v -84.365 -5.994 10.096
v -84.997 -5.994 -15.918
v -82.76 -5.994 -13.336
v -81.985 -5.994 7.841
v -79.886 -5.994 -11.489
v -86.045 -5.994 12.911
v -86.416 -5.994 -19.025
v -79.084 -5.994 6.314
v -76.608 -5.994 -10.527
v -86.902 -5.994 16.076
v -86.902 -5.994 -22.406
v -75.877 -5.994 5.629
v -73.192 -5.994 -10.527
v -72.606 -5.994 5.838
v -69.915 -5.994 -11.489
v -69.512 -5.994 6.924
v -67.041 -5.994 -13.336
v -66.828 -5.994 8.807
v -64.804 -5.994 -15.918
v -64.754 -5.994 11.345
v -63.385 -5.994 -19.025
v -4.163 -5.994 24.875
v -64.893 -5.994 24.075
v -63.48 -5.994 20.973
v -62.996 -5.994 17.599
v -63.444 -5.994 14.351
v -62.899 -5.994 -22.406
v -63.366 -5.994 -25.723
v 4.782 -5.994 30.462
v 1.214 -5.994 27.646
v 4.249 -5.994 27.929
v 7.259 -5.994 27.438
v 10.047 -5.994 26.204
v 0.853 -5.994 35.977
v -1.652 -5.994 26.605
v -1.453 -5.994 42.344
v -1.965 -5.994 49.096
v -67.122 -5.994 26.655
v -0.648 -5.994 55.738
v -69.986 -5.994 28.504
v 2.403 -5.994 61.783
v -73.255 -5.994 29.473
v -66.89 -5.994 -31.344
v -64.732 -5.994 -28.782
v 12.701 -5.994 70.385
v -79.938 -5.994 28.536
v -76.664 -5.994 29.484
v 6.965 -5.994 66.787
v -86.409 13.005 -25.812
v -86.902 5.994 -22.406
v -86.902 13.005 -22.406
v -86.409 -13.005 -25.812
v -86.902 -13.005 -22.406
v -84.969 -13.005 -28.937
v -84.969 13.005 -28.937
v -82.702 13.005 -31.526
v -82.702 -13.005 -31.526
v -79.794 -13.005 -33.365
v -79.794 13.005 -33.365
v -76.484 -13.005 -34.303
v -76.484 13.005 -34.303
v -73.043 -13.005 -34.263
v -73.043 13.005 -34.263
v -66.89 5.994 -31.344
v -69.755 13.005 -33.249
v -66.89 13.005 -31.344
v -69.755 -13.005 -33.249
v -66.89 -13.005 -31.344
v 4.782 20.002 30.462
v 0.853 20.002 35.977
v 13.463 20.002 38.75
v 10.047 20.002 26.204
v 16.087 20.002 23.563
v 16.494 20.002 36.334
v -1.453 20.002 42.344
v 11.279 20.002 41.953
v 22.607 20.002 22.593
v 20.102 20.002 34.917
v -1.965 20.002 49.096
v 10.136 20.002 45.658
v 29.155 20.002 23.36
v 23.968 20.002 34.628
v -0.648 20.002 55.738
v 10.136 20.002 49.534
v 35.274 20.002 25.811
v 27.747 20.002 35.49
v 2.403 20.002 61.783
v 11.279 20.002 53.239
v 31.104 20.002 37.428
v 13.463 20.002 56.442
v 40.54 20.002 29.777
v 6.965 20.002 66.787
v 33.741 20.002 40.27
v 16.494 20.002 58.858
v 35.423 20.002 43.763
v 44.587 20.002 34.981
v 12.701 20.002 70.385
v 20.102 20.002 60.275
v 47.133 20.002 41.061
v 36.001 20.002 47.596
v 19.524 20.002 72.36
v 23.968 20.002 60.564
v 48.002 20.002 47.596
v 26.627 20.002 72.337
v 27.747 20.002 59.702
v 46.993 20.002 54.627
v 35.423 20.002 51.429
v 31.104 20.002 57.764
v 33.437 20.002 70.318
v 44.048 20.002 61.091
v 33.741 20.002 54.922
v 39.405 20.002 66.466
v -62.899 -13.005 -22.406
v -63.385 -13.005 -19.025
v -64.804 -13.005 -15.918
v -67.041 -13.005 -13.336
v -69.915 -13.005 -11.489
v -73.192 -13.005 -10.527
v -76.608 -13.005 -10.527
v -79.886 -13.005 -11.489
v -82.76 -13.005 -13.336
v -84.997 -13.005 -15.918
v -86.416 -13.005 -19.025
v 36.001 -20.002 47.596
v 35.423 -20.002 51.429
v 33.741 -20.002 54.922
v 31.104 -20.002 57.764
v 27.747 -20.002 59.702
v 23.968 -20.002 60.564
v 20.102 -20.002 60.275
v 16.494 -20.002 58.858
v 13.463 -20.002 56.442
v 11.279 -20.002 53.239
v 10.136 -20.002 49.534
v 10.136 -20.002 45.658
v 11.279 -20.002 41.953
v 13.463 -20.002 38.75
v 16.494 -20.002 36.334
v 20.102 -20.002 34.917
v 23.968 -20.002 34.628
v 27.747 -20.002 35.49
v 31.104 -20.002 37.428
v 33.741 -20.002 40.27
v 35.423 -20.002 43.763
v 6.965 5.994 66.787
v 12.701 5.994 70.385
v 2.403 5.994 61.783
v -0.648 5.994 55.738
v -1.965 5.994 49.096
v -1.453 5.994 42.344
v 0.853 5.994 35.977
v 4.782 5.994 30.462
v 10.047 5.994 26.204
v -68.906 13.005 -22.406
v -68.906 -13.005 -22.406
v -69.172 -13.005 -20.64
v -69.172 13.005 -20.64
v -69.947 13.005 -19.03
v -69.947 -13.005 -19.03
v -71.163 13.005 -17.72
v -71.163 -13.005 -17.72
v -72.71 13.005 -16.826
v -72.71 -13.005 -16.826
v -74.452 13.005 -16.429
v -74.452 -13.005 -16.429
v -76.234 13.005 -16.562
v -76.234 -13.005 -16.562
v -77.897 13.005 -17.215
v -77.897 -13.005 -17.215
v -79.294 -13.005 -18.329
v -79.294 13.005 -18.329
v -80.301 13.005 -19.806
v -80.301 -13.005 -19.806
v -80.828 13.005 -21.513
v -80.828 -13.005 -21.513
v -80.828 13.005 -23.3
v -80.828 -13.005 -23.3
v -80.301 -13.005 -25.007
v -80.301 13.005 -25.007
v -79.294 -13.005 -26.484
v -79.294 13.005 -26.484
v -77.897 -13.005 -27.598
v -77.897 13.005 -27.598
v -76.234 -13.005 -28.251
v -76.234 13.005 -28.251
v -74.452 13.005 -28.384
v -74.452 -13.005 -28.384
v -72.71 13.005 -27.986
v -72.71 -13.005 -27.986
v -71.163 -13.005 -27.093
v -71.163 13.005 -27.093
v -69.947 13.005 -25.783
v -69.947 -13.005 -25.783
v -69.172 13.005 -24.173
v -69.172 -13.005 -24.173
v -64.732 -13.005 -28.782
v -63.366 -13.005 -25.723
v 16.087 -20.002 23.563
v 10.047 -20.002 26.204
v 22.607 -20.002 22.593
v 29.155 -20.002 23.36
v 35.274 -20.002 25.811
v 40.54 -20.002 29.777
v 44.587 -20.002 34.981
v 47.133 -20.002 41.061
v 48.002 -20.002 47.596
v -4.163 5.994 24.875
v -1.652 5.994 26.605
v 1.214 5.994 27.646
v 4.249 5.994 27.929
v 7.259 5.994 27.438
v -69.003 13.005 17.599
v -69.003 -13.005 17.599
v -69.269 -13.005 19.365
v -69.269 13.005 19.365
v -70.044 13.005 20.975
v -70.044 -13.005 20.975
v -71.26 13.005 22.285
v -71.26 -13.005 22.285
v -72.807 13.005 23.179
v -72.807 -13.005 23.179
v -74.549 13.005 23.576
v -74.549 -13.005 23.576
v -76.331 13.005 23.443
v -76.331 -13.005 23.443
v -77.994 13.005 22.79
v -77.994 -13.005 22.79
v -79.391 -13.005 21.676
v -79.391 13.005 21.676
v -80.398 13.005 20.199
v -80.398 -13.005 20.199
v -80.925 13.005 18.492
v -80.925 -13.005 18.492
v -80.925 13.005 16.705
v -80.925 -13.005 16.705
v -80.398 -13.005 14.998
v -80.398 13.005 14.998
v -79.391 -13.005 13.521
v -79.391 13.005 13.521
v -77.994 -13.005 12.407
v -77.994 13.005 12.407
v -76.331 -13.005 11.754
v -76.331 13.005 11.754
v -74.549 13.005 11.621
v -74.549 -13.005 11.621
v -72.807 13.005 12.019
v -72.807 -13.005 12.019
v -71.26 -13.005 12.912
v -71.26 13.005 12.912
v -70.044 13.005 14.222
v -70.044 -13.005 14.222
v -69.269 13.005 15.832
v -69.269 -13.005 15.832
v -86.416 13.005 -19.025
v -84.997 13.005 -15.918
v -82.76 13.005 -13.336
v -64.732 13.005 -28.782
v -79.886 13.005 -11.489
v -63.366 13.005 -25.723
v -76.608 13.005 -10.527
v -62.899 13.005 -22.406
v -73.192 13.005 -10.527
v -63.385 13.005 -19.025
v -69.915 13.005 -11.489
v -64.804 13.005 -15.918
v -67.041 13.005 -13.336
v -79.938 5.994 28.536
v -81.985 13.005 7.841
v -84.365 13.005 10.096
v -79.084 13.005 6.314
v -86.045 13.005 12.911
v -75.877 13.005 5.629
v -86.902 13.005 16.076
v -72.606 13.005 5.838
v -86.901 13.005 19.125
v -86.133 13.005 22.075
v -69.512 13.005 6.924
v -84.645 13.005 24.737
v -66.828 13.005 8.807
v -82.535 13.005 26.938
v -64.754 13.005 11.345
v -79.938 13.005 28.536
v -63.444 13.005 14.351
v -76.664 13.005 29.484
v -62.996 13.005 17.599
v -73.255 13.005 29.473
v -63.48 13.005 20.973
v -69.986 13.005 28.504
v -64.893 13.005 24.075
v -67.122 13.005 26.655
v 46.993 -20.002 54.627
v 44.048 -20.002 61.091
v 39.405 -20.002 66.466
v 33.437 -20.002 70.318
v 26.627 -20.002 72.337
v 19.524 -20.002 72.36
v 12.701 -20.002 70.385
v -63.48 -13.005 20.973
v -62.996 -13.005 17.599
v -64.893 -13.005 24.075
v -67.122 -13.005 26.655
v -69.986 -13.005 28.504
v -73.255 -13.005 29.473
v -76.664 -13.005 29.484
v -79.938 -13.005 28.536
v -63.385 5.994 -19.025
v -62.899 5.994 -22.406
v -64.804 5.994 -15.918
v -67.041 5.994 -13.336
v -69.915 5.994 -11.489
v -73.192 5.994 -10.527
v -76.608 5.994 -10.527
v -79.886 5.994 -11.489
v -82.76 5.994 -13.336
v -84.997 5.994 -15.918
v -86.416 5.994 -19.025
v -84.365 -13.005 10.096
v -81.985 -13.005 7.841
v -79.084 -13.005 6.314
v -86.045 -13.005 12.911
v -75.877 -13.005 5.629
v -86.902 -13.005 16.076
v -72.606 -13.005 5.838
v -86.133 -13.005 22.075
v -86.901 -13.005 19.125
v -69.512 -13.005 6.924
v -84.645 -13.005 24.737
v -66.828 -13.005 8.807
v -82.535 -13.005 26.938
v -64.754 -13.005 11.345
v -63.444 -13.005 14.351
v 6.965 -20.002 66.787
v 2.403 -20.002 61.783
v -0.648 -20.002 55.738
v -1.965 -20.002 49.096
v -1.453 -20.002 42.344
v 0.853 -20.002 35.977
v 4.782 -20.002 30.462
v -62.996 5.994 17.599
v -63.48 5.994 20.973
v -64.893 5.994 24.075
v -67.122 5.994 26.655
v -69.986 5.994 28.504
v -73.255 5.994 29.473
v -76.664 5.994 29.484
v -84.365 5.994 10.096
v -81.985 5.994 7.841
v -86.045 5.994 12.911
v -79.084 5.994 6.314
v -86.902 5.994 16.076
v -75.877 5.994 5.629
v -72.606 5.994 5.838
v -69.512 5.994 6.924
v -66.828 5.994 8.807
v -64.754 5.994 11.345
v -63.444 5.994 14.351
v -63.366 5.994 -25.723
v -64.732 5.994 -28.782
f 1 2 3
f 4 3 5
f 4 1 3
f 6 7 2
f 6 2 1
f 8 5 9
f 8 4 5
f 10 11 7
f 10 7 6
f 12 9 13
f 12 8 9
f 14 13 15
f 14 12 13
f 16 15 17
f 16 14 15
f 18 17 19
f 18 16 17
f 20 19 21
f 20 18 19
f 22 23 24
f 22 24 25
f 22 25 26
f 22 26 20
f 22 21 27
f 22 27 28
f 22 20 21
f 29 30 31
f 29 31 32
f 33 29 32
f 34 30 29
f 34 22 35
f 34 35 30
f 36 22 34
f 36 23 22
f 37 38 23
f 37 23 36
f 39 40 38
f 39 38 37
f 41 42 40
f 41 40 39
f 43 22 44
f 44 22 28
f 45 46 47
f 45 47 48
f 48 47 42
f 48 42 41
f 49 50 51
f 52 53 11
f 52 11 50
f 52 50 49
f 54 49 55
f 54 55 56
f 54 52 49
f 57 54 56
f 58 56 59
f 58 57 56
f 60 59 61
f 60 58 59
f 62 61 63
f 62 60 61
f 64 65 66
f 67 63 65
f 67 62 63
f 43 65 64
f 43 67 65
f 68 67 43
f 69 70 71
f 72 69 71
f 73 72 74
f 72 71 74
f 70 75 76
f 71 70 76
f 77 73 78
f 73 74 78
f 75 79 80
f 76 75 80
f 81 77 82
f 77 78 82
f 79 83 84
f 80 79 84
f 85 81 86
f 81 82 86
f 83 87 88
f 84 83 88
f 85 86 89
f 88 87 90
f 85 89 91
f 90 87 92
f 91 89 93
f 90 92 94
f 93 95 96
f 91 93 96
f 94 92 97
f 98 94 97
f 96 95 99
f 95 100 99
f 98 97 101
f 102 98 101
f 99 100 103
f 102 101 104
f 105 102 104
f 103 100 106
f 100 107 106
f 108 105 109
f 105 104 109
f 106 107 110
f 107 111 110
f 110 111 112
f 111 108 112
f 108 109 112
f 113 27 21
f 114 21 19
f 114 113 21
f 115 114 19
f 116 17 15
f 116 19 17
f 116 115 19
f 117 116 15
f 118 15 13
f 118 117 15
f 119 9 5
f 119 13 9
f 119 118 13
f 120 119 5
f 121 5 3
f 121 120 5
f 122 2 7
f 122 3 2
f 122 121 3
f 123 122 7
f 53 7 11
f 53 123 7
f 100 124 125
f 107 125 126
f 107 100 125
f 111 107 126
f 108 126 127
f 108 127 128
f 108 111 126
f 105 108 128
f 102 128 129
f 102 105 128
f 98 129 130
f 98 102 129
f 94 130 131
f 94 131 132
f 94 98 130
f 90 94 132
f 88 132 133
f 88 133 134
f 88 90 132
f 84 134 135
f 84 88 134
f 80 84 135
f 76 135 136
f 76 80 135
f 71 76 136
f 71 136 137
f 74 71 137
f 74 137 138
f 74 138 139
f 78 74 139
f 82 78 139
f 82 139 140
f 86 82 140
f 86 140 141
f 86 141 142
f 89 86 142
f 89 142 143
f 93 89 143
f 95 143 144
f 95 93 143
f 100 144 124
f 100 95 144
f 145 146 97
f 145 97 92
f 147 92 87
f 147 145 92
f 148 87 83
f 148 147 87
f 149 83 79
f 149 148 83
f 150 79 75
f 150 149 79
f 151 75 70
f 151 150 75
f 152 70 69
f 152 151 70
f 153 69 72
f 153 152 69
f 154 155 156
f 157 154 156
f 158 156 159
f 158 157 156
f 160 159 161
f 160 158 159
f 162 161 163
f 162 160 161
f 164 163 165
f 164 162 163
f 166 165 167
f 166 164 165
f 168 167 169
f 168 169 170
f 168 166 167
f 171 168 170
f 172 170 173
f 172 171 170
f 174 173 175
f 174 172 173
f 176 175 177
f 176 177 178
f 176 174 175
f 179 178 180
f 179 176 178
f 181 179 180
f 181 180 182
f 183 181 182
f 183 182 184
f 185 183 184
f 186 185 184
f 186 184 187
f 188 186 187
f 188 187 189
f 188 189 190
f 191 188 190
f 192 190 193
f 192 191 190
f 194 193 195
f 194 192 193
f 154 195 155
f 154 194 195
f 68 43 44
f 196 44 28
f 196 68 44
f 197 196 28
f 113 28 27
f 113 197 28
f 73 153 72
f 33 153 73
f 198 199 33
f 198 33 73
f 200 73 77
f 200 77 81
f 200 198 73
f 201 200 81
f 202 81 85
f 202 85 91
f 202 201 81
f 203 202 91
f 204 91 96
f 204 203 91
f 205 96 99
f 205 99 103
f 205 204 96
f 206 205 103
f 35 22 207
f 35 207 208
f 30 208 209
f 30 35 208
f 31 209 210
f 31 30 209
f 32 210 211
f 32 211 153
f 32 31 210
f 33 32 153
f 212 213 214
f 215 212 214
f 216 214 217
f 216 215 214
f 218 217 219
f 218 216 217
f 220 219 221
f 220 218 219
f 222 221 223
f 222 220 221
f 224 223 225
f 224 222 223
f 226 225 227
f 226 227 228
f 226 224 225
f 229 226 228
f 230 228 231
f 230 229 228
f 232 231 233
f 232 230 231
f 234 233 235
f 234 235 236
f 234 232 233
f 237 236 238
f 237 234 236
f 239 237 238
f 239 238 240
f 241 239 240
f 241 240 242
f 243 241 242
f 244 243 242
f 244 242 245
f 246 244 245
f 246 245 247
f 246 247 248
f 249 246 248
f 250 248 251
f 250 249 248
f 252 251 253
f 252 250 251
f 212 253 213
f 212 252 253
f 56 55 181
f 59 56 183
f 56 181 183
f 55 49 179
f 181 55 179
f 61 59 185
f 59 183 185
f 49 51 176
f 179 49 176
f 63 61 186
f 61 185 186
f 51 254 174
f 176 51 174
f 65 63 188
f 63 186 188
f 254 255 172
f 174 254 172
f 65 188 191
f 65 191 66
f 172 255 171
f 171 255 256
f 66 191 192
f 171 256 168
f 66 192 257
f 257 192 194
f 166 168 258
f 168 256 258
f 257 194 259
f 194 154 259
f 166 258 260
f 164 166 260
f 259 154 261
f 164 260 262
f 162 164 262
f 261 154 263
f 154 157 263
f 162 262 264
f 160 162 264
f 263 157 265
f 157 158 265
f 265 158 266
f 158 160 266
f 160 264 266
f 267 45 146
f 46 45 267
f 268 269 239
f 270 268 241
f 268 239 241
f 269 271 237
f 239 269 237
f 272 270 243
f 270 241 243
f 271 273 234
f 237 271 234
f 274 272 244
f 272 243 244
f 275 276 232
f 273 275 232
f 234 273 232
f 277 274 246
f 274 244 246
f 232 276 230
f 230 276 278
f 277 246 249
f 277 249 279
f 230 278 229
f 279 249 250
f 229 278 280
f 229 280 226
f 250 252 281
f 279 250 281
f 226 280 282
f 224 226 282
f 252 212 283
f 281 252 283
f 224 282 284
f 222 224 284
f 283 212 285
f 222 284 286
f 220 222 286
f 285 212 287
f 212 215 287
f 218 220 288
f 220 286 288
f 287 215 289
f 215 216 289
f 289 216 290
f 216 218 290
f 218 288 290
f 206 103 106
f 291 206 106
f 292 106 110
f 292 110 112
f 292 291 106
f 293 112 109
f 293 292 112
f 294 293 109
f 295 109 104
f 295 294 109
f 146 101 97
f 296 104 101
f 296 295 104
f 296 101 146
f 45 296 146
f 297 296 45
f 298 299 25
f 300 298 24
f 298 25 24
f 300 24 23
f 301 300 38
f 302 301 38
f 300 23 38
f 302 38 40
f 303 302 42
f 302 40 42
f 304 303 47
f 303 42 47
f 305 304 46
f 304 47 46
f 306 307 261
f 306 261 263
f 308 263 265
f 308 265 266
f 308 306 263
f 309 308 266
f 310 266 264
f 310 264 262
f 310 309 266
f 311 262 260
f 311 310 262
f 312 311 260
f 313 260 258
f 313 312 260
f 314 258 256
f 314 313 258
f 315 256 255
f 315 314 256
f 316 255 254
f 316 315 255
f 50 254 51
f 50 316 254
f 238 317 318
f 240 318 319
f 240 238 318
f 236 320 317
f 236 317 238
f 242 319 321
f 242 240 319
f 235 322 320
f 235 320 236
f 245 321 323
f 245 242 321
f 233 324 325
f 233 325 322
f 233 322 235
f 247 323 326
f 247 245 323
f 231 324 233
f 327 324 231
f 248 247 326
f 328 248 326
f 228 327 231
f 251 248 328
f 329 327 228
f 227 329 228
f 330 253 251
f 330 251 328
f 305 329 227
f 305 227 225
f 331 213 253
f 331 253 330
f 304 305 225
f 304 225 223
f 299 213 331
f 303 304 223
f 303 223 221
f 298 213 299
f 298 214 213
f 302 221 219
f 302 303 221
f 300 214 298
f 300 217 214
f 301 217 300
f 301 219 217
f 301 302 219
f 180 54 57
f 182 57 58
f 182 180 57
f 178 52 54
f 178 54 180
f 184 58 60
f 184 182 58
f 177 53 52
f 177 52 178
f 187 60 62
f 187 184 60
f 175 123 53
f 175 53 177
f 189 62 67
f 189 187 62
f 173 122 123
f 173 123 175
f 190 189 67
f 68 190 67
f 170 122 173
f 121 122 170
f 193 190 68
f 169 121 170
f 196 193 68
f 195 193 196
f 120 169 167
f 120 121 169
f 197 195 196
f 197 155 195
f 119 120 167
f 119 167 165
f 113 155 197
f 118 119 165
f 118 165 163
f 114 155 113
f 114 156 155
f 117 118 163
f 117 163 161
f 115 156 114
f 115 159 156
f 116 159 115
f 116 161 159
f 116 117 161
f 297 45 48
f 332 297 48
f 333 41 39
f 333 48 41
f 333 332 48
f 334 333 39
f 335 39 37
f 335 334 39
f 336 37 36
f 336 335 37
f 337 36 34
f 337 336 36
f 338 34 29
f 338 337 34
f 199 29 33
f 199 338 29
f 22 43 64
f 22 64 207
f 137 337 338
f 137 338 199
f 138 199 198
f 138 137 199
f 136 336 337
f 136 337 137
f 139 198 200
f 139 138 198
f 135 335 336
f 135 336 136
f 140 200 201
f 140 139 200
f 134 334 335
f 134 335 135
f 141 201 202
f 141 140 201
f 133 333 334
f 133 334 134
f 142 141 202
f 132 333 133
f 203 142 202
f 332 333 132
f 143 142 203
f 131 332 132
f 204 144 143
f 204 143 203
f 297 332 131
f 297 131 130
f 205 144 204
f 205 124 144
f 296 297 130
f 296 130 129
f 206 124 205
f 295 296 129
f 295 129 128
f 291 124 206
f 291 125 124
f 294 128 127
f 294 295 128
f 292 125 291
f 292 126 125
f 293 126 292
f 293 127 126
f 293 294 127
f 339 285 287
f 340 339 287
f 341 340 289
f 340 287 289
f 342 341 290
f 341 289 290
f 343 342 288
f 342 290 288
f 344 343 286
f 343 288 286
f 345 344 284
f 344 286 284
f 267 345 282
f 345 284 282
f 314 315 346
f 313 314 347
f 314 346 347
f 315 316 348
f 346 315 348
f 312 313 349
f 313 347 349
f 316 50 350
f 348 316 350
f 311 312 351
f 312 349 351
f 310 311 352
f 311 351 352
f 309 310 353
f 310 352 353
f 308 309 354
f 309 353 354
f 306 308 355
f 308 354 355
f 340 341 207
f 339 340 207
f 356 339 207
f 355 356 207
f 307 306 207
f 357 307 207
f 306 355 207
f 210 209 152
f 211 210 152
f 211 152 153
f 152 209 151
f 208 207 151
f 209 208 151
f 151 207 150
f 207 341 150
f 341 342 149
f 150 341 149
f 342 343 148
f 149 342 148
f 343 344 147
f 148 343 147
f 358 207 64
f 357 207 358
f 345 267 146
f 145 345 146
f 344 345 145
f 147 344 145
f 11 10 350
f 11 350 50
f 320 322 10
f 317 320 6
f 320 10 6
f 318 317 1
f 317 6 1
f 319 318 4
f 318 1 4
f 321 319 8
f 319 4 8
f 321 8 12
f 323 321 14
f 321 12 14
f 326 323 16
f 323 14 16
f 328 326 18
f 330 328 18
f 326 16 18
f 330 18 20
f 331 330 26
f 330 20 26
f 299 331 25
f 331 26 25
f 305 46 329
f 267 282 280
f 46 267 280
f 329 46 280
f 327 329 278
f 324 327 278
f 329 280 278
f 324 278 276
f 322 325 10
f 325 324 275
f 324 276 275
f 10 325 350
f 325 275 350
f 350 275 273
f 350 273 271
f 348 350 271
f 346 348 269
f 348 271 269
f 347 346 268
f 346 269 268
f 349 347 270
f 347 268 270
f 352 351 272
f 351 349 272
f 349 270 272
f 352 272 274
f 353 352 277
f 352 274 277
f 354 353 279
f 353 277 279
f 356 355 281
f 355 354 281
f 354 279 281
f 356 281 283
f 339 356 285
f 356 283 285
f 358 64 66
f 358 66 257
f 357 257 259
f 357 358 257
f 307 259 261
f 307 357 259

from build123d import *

# Parameters (mm, degrees)
F1_DEPTH = 5.9944
F0_R     = 13.0048
F2_DEPTH = 20.0025
F0_R_2   = 5.9944
F3_DEPTH = 13.0048


with BuildPart() as f1:
    # F0 (on Front) → F1 (new body, symmetric)
    with BuildSketch(Plane.XZ):
        with BuildLine():
            ThreePointArc((-79.938103, 28.535882), (-68.488104, 27.681584), (-62.995777, 17.598595))
            ThreePointArc((-62.995777, 17.598595), (-74.23434, 5.62137), (-86.901777, 16.075807))
            Line((-86.901777, 16.075807), (-86.901777, -22.406405))
            ThreePointArc((-86.901777, -22.406405), (-74.900277, -10.404905), (-62.898777, -22.406405))
            ThreePointArc((-62.898777, -22.406405), (-63.941977, -27.300448), (-66.890221, -31.343686))
            Line((-66.890221, -31.343686), (-4.163324, 24.875419))
            ThreePointArc((-4.163324, 24.875419), (2.722442, 27.884357), (10.046576, 26.203719))
            ThreePointArc((10.046576, 26.203719), (-1.965359, 49.095809), (12.701229, 70.384903))
            Line((12.701229, 70.384903), (-79.938103, 28.535882))
        make_face()
    extrude(amount=F1_DEPTH, both=True)

    # F0 (on Front) → F2 (join, symmetric)
    with BuildSketch(Plane.XZ):
        with BuildLine():
            ThreePointArc((48.002223, 47.595995), (36.558423, 68.604889), (12.701229, 70.384903))
            ThreePointArc((12.701229, 70.384903), (-1.965359, 49.095809), (10.046576, 26.203719))
            ThreePointArc((10.046576, 26.203719), (35.273948, 25.811479), (48.002223, 47.595995))
        make_face()
        with Locations((22.995923, 47.595995)):
            Circle(F0_R, mode=Mode.SUBTRACT)
    extrude(amount=F2_DEPTH, both=True)

    # F0 (on Front) → F3 (join, symmetric)
    with BuildSketch(Plane.XZ):
        with BuildLine():
            ThreePointArc((-86.901777, 16.075807), (-74.23434, 5.62137), (-62.995777, 17.598595))
            ThreePointArc((-62.995777, 17.598595), (-68.488104, 27.681584), (-79.938103, 28.535882))
            ThreePointArc((-79.938103, 28.535882), (-85.473661, 23.453626), (-86.901777, 16.075807))
        make_face()
        with Locations((-74.997277, 17.598595)):
            Circle(F0_R_2, mode=Mode.SUBTRACT)
        with BuildLine():
            ThreePointArc((-62.898777, -22.406405), (-74.900277, -10.404905), (-86.901777, -22.406405))
            ThreePointArc((-86.901777, -22.406405), (-79.79432, -33.364705), (-66.890221, -31.343686))
            ThreePointArc((-66.890221, -31.343686), (-63.941977, -27.300448), (-62.898777, -22.406405))
        make_face()
        with Locations((-74.900277, -22.406405)):
            Circle(F0_R_2, mode=Mode.SUBTRACT)
    extrude(amount=F3_DEPTH, both=True)


solid = f1.part
